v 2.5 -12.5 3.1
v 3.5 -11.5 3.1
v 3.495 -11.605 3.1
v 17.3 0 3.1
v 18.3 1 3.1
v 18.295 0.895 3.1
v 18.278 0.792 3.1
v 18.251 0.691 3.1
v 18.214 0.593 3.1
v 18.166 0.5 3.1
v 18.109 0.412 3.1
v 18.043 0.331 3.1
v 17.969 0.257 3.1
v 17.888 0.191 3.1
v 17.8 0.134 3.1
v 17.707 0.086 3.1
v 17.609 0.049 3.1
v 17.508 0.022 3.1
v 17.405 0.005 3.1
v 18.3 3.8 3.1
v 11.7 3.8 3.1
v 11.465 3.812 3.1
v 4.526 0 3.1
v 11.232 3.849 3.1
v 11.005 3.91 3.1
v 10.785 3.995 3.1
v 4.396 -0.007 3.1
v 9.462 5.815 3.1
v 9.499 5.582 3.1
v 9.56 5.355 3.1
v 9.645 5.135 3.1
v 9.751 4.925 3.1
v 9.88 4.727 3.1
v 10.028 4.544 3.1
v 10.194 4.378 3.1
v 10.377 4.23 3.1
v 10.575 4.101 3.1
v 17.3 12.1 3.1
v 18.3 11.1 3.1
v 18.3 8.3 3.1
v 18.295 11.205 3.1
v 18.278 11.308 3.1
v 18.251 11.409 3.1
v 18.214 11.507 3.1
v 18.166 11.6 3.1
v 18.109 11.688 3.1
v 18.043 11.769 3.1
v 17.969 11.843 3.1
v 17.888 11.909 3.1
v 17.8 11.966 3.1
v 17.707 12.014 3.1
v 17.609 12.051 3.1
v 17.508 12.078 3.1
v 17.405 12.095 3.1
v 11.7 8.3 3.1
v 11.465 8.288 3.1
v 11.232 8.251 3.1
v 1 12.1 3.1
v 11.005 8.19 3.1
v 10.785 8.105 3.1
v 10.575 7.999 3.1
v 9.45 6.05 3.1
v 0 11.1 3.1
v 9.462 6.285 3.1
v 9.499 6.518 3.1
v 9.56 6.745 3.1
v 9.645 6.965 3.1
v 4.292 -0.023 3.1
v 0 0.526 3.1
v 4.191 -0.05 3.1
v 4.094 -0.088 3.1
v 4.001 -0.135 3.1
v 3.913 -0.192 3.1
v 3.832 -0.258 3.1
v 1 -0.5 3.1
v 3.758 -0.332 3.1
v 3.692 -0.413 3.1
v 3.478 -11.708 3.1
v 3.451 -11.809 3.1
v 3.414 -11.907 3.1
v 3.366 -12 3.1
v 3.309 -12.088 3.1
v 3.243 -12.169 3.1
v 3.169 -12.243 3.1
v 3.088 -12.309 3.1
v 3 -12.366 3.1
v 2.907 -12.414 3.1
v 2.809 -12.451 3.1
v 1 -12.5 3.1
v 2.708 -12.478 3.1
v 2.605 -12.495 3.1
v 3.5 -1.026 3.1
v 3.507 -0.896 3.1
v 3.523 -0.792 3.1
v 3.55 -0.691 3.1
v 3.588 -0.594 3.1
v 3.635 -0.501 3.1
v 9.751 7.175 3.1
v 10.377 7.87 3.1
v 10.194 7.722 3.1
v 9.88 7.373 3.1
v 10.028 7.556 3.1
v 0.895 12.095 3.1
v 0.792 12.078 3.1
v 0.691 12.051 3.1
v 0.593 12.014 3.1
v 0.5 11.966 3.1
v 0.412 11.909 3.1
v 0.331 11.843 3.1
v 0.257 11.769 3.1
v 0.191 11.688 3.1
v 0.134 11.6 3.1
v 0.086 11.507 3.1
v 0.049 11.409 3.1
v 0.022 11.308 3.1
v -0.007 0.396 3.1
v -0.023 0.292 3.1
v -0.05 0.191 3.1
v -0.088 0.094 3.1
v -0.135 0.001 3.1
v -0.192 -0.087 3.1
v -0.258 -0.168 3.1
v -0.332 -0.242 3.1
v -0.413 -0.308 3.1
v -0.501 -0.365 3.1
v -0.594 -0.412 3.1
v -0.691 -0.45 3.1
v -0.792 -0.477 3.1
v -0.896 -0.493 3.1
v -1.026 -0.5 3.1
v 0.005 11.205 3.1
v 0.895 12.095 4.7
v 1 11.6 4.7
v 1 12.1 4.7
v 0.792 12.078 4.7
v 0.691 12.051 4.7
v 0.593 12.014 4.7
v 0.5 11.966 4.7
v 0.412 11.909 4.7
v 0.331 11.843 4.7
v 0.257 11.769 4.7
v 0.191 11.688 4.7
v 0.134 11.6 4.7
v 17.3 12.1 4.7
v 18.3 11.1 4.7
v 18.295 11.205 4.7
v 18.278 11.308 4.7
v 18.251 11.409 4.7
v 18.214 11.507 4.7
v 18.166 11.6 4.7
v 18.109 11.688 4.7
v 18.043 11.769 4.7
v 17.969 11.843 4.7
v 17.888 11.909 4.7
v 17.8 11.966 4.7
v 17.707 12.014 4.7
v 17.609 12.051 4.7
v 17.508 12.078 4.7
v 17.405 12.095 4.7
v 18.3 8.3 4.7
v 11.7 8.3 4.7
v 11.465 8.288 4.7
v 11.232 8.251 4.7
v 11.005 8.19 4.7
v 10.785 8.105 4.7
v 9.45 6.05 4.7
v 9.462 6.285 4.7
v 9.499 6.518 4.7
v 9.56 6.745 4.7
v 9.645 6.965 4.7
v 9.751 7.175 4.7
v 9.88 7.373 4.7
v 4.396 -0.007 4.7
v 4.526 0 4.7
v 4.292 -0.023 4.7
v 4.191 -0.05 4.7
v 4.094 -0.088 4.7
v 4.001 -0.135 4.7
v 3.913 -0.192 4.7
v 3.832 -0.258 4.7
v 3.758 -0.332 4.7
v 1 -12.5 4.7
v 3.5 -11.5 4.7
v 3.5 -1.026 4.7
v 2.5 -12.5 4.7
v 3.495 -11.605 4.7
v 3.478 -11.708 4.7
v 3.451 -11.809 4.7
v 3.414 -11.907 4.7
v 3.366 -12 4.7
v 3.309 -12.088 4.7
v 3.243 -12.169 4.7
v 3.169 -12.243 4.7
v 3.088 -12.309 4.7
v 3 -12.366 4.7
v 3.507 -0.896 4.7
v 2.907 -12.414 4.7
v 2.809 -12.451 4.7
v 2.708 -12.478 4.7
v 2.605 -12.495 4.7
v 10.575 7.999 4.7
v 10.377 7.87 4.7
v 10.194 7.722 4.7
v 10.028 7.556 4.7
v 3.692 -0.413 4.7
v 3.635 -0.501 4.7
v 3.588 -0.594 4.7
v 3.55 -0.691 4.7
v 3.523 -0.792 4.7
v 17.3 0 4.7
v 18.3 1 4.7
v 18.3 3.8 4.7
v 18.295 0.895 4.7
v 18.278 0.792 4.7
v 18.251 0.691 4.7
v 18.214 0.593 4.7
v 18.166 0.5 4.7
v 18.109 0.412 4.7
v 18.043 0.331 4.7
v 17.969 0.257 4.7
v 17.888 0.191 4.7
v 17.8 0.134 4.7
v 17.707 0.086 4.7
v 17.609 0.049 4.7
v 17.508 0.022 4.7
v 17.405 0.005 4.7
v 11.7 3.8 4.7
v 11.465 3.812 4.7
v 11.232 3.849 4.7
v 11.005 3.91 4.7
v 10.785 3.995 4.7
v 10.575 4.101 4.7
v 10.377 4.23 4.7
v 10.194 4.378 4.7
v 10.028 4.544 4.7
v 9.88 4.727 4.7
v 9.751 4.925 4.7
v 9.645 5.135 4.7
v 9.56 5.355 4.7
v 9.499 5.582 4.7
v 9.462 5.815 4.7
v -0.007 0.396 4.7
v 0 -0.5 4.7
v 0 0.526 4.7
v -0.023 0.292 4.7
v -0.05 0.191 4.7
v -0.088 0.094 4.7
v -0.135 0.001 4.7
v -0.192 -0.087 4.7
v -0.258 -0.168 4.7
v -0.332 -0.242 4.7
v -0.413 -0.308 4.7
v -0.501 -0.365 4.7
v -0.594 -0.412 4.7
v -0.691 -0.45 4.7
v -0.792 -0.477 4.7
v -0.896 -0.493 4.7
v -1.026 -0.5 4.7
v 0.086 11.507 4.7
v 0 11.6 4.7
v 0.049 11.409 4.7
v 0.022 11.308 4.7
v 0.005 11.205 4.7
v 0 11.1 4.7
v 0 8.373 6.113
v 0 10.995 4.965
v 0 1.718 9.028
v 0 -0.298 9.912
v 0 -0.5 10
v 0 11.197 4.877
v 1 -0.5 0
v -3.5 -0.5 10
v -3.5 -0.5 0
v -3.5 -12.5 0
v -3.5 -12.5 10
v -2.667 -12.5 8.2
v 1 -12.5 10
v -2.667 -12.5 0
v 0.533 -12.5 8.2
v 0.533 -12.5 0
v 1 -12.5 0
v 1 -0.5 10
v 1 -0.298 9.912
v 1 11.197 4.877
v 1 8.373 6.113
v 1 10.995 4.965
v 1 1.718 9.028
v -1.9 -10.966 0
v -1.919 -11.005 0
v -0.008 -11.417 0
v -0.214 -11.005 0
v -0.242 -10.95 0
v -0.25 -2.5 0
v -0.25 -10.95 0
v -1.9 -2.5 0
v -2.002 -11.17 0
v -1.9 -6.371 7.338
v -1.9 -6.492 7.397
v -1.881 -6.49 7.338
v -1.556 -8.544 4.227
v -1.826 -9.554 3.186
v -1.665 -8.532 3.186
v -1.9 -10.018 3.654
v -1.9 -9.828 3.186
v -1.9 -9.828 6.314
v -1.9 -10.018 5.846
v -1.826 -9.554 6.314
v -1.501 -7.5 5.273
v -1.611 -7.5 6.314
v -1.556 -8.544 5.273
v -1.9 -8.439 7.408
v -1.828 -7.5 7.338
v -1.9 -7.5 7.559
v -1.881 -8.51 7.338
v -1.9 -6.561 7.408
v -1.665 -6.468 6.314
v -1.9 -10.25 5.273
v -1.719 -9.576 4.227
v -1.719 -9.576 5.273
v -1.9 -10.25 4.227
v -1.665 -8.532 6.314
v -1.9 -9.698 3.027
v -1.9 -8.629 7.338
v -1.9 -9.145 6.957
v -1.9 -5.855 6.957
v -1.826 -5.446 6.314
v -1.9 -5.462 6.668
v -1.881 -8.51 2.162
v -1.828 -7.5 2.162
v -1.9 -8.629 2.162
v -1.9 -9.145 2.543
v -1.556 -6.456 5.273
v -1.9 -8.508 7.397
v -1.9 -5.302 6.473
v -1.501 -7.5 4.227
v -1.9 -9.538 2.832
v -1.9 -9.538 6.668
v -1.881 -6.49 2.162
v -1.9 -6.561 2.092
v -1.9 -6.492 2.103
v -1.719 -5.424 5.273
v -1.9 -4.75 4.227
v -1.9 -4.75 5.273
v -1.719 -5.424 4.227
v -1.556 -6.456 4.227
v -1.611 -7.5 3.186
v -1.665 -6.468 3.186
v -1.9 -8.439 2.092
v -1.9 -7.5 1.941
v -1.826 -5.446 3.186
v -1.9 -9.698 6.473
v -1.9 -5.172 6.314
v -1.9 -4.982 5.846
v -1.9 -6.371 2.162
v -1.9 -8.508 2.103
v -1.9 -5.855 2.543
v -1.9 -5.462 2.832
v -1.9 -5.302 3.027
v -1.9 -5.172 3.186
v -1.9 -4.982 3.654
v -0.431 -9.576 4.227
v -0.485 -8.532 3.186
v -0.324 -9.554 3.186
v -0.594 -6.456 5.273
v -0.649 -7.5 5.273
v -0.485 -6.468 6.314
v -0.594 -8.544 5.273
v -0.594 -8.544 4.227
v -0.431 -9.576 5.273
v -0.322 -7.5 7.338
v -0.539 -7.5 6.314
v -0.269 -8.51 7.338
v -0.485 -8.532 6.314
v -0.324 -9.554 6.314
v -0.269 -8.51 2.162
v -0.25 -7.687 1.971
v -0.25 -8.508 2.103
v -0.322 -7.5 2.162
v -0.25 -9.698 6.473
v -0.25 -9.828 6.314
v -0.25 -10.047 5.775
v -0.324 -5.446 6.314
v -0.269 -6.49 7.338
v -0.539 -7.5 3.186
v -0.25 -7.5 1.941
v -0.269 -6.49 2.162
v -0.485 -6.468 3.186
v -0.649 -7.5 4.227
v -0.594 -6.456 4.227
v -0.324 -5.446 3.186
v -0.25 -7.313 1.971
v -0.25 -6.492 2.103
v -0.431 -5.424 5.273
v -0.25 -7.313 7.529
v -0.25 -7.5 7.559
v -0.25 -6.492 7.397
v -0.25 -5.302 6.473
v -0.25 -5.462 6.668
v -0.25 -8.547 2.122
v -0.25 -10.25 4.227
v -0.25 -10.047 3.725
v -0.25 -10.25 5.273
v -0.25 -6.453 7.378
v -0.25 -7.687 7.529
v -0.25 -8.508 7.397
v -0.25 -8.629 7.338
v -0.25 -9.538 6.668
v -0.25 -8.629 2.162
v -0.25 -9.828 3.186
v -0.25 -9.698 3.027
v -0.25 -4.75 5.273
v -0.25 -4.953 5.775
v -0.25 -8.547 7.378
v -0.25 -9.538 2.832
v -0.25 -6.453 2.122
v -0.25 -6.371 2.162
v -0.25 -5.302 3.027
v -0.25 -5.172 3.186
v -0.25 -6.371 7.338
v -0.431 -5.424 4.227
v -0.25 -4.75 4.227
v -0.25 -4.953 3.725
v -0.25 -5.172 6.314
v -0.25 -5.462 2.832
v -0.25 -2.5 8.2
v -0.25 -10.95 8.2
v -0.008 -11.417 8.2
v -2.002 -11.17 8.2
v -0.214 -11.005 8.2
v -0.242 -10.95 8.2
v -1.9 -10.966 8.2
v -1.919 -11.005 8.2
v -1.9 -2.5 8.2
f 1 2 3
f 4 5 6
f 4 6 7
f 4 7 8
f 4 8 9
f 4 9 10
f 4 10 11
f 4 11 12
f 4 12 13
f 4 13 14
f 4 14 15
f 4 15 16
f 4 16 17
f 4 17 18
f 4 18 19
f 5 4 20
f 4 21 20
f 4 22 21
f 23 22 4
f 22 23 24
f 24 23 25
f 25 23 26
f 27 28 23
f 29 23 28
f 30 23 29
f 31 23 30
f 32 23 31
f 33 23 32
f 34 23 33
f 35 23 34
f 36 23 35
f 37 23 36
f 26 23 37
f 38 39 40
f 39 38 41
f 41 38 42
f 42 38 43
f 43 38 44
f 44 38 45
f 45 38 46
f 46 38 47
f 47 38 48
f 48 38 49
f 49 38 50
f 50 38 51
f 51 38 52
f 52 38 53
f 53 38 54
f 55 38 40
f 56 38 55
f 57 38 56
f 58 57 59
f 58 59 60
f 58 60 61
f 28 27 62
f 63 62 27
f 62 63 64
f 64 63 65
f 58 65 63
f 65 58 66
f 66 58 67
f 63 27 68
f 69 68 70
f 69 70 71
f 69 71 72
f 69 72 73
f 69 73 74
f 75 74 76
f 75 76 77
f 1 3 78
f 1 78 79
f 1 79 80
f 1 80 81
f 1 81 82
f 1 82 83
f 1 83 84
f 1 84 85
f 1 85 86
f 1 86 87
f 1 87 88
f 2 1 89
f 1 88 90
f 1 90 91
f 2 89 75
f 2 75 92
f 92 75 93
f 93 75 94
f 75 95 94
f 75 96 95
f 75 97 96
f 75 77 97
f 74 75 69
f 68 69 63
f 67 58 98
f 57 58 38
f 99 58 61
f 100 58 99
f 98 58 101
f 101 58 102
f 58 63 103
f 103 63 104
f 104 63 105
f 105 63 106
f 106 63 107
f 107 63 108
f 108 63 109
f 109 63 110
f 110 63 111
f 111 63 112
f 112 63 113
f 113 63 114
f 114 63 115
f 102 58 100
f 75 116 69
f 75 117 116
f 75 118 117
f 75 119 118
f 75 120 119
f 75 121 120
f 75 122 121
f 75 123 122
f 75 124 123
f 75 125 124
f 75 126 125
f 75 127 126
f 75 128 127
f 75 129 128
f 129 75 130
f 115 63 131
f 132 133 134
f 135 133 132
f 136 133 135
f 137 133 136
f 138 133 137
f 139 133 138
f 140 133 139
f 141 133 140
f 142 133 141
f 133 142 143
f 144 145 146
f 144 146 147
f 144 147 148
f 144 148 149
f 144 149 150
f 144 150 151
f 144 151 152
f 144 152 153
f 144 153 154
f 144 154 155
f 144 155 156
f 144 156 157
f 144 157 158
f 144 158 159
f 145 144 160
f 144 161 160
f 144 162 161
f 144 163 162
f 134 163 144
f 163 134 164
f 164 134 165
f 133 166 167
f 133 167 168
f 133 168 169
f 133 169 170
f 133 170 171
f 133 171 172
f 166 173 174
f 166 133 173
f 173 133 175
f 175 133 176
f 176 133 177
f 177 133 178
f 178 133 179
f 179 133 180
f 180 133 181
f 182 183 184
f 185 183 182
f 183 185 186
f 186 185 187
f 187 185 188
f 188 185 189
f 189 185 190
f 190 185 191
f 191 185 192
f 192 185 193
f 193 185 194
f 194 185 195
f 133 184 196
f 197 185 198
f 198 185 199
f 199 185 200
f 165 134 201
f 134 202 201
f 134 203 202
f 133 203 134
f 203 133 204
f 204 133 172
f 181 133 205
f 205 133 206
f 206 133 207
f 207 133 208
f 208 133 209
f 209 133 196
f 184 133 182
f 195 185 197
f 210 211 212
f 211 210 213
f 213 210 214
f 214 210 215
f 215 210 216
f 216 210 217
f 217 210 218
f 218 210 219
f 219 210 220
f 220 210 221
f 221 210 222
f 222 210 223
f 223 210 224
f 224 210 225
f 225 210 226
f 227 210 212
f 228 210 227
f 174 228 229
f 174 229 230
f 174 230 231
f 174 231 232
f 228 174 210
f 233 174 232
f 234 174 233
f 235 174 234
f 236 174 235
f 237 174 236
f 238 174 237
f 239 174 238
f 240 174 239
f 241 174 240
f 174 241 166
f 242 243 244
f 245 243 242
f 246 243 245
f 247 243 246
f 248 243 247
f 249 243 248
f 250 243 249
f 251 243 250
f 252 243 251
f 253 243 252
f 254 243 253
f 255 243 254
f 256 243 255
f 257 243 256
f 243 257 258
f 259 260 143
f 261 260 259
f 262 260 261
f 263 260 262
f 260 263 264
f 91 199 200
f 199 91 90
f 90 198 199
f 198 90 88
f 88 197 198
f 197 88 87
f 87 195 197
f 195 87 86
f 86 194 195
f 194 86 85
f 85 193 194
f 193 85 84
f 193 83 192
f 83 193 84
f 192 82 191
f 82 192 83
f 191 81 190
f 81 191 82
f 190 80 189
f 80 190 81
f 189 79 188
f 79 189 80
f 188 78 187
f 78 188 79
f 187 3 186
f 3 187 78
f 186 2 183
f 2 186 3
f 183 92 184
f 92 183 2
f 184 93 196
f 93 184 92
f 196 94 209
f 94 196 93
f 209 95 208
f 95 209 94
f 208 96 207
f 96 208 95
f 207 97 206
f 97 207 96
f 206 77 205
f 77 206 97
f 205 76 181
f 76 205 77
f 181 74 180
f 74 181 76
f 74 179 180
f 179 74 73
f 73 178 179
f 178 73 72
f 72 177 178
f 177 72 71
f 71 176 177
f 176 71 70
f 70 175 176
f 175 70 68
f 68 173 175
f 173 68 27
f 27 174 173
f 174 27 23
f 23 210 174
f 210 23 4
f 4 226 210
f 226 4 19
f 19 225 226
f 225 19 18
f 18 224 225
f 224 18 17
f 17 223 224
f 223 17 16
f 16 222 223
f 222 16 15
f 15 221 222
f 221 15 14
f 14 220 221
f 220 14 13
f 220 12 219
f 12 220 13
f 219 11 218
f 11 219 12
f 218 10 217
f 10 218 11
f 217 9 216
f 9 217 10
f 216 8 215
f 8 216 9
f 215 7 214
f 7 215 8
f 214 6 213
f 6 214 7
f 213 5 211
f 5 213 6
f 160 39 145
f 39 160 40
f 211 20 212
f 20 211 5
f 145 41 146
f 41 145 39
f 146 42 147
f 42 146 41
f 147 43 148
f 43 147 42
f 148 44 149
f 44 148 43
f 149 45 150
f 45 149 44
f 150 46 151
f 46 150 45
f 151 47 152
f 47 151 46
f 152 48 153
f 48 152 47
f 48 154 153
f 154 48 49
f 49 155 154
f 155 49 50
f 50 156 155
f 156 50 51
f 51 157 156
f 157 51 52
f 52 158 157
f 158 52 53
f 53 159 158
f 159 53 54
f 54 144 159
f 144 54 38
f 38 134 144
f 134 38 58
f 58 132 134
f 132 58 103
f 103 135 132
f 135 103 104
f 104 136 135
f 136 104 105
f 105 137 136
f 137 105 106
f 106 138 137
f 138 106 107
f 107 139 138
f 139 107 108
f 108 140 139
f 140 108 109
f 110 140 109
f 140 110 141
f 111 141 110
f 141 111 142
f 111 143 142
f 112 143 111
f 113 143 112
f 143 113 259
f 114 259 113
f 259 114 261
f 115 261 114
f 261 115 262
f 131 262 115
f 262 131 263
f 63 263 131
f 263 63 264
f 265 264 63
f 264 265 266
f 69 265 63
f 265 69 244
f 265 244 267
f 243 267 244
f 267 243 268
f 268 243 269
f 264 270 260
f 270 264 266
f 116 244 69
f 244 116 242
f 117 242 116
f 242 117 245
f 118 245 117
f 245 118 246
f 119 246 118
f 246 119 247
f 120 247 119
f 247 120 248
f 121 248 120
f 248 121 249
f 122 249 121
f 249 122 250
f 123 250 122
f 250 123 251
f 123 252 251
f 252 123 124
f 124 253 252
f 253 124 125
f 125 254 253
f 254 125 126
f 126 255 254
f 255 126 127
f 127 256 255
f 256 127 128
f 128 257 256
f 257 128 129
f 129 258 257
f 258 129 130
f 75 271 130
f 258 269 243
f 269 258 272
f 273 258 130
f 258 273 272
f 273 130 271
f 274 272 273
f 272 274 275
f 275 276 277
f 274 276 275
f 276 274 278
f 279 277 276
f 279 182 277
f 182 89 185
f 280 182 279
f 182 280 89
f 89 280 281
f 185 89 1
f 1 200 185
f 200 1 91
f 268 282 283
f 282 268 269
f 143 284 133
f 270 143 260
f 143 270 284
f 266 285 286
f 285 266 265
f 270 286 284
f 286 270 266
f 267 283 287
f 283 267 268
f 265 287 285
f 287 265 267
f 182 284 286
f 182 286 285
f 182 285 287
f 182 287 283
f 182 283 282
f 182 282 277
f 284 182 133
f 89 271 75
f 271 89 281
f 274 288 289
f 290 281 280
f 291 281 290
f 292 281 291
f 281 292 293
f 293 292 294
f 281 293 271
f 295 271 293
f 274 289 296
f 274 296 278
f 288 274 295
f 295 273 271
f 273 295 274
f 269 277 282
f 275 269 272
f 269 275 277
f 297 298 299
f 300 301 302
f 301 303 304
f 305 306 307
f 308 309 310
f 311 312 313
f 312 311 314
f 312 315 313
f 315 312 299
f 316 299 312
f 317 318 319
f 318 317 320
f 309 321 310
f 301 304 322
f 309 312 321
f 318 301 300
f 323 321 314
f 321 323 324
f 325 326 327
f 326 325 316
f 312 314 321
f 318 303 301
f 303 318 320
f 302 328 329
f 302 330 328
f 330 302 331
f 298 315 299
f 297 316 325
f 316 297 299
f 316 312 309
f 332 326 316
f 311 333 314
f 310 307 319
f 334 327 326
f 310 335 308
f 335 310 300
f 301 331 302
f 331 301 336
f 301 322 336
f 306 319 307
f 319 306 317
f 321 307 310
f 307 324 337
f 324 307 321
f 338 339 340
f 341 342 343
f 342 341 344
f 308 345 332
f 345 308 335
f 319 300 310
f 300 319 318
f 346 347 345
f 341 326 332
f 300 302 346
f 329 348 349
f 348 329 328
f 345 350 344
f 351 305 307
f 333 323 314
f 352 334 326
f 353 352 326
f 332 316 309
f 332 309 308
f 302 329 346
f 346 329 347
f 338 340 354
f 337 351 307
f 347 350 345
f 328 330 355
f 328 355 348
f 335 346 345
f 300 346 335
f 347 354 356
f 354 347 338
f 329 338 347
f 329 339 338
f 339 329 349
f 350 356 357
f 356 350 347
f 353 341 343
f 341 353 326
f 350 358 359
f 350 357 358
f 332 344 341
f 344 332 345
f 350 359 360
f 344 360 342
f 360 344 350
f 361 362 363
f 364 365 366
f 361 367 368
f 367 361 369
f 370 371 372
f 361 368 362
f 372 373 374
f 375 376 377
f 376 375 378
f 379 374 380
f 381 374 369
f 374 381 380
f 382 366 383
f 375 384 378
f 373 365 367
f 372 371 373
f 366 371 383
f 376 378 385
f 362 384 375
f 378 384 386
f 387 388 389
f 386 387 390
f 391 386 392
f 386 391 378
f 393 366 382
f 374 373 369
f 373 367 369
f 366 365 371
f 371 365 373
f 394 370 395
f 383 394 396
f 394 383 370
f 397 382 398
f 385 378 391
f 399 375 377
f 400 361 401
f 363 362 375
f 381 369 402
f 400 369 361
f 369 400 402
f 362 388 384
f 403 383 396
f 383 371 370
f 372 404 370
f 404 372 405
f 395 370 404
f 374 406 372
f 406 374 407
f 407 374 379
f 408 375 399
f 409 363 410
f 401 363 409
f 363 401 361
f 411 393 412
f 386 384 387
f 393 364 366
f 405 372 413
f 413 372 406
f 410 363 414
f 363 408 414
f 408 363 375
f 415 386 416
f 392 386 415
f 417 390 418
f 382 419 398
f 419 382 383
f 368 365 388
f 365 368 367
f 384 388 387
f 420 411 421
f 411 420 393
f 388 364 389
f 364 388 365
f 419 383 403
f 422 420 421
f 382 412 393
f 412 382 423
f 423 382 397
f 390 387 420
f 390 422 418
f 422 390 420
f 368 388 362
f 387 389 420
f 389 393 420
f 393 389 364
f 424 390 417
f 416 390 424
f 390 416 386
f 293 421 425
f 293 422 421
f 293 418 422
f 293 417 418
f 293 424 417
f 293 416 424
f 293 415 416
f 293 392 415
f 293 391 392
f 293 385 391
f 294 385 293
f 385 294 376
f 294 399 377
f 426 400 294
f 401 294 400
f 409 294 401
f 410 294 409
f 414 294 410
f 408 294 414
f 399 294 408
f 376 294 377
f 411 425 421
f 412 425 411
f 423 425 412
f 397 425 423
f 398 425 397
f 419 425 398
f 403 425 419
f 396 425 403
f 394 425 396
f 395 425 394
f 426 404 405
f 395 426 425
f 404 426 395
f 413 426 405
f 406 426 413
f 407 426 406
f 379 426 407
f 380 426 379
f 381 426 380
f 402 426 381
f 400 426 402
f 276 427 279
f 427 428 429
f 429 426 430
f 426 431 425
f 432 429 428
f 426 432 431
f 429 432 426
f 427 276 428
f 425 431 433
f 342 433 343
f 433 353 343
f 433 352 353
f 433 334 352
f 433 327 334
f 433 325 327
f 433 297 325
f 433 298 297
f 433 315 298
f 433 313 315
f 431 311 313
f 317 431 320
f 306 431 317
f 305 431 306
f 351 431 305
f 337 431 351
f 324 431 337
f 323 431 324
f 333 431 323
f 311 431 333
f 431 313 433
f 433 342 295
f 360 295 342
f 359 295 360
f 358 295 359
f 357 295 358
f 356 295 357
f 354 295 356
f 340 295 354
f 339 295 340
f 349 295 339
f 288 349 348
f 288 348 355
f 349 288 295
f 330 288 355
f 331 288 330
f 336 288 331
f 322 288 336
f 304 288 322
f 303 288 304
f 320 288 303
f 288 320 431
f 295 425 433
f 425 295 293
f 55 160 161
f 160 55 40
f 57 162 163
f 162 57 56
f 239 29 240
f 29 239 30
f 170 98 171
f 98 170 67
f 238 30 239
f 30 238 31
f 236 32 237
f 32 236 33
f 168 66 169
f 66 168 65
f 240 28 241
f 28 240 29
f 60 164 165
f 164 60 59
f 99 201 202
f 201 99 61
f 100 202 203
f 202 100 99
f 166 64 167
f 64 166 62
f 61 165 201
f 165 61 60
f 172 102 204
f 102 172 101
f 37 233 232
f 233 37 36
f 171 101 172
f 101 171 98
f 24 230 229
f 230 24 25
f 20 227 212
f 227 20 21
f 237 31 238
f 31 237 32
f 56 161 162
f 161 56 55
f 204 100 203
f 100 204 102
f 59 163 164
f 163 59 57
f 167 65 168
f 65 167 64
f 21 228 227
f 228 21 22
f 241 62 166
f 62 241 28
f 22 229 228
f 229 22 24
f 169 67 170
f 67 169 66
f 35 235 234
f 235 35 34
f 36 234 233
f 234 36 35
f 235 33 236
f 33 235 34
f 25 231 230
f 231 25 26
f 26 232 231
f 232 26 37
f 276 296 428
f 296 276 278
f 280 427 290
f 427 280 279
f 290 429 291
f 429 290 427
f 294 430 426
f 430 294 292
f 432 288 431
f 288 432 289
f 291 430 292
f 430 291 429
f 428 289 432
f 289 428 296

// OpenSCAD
//cf.
// https://patentimages.storage.googleapis.com/60/f1/db/b4e09dc452baed/US4745524.pdf

bracket_plate_bbox = [18.3,12.1,1.6];

bracket_plate_offset = [0,0,0];

board_clip_plate_bbox = [7,12,1.6];

board_clip_bbox = [4.5,12,10];

board_clip_offset = [0,0,0];

card_offset = [-.25,-2.5,5.1];

card_thickness = 1.65;

$fn = 60;

module holder() {
    difference() {
        union() {
            linear_extrude(bracket_plate_bbox.z) {
                offset(1) offset(-1-1) offset(1) {
                    translate(bracket_plate_offset) square([bracket_plate_bbox.x,bracket_plate_bbox.y]);
                    translate([0,-board_clip_plate_bbox.y/2-.5]) square([board_clip_plate_bbox.x,board_clip_plate_bbox.y], center=true);
                }
            }
            // reinforcement
            translate([0,-0.5,bracket_plate_bbox.z]) linear_extrude(board_clip_bbox.z-3.1-bracket_plate_bbox.z, scale=[1,0]) square([1,bracket_plate_bbox.y]);
            translate(board_clip_offset-[board_clip_plate_bbox.x/2,board_clip_plate_bbox.y+0.5,3.1]) linear_extrude(board_clip_bbox.z) square([board_clip_bbox.x,board_clip_bbox.y]);
        }
        hull() for(dx=[-1,1])
            translate([bracket_plate_bbox.x+dx*6.6,bracket_plate_bbox.y/2,0])
                cylinder(d=4.5,h=10, center=true);
        // space for the card
        difference() {
            translate(card_offset+[-card_thickness,-20,-20]) cube([card_thickness,20,20]);
            for(dx=[-1,1]) {
                bulge_r = 10;
                translate([-card_thickness/2+dx*(bulge_r+card_thickness/4),1-board_clip_bbox.y/2,-(board_clip_bbox.z-3.1)/2]+card_offset) sphere(r=bulge_r);
            }
        }
        translate(card_offset+[board_clip_bbox.x/2-1.98
       *card_thickness+0.2,-.5-board_clip_bbox.y+2.4,-10+card_offset.z-0.1]) rotate([-90,0,0]) linear_extrude(card_thickness, scale=[1/2,1]) square([card_thickness*2,10], center=true);
        //if ($preview) rotate([180,180,0]) cube(100);
    }
}

module card() {
    translate(card_offset+[-card_thickness,-20,-20]) cube([card_thickness,20,20]);
}

module bracket() {
}



if ($preview) {
    //color("green", 0.2) card();
    color("silver", 0.2) bracket();
}
translate([0,0,3.1]) holder();
